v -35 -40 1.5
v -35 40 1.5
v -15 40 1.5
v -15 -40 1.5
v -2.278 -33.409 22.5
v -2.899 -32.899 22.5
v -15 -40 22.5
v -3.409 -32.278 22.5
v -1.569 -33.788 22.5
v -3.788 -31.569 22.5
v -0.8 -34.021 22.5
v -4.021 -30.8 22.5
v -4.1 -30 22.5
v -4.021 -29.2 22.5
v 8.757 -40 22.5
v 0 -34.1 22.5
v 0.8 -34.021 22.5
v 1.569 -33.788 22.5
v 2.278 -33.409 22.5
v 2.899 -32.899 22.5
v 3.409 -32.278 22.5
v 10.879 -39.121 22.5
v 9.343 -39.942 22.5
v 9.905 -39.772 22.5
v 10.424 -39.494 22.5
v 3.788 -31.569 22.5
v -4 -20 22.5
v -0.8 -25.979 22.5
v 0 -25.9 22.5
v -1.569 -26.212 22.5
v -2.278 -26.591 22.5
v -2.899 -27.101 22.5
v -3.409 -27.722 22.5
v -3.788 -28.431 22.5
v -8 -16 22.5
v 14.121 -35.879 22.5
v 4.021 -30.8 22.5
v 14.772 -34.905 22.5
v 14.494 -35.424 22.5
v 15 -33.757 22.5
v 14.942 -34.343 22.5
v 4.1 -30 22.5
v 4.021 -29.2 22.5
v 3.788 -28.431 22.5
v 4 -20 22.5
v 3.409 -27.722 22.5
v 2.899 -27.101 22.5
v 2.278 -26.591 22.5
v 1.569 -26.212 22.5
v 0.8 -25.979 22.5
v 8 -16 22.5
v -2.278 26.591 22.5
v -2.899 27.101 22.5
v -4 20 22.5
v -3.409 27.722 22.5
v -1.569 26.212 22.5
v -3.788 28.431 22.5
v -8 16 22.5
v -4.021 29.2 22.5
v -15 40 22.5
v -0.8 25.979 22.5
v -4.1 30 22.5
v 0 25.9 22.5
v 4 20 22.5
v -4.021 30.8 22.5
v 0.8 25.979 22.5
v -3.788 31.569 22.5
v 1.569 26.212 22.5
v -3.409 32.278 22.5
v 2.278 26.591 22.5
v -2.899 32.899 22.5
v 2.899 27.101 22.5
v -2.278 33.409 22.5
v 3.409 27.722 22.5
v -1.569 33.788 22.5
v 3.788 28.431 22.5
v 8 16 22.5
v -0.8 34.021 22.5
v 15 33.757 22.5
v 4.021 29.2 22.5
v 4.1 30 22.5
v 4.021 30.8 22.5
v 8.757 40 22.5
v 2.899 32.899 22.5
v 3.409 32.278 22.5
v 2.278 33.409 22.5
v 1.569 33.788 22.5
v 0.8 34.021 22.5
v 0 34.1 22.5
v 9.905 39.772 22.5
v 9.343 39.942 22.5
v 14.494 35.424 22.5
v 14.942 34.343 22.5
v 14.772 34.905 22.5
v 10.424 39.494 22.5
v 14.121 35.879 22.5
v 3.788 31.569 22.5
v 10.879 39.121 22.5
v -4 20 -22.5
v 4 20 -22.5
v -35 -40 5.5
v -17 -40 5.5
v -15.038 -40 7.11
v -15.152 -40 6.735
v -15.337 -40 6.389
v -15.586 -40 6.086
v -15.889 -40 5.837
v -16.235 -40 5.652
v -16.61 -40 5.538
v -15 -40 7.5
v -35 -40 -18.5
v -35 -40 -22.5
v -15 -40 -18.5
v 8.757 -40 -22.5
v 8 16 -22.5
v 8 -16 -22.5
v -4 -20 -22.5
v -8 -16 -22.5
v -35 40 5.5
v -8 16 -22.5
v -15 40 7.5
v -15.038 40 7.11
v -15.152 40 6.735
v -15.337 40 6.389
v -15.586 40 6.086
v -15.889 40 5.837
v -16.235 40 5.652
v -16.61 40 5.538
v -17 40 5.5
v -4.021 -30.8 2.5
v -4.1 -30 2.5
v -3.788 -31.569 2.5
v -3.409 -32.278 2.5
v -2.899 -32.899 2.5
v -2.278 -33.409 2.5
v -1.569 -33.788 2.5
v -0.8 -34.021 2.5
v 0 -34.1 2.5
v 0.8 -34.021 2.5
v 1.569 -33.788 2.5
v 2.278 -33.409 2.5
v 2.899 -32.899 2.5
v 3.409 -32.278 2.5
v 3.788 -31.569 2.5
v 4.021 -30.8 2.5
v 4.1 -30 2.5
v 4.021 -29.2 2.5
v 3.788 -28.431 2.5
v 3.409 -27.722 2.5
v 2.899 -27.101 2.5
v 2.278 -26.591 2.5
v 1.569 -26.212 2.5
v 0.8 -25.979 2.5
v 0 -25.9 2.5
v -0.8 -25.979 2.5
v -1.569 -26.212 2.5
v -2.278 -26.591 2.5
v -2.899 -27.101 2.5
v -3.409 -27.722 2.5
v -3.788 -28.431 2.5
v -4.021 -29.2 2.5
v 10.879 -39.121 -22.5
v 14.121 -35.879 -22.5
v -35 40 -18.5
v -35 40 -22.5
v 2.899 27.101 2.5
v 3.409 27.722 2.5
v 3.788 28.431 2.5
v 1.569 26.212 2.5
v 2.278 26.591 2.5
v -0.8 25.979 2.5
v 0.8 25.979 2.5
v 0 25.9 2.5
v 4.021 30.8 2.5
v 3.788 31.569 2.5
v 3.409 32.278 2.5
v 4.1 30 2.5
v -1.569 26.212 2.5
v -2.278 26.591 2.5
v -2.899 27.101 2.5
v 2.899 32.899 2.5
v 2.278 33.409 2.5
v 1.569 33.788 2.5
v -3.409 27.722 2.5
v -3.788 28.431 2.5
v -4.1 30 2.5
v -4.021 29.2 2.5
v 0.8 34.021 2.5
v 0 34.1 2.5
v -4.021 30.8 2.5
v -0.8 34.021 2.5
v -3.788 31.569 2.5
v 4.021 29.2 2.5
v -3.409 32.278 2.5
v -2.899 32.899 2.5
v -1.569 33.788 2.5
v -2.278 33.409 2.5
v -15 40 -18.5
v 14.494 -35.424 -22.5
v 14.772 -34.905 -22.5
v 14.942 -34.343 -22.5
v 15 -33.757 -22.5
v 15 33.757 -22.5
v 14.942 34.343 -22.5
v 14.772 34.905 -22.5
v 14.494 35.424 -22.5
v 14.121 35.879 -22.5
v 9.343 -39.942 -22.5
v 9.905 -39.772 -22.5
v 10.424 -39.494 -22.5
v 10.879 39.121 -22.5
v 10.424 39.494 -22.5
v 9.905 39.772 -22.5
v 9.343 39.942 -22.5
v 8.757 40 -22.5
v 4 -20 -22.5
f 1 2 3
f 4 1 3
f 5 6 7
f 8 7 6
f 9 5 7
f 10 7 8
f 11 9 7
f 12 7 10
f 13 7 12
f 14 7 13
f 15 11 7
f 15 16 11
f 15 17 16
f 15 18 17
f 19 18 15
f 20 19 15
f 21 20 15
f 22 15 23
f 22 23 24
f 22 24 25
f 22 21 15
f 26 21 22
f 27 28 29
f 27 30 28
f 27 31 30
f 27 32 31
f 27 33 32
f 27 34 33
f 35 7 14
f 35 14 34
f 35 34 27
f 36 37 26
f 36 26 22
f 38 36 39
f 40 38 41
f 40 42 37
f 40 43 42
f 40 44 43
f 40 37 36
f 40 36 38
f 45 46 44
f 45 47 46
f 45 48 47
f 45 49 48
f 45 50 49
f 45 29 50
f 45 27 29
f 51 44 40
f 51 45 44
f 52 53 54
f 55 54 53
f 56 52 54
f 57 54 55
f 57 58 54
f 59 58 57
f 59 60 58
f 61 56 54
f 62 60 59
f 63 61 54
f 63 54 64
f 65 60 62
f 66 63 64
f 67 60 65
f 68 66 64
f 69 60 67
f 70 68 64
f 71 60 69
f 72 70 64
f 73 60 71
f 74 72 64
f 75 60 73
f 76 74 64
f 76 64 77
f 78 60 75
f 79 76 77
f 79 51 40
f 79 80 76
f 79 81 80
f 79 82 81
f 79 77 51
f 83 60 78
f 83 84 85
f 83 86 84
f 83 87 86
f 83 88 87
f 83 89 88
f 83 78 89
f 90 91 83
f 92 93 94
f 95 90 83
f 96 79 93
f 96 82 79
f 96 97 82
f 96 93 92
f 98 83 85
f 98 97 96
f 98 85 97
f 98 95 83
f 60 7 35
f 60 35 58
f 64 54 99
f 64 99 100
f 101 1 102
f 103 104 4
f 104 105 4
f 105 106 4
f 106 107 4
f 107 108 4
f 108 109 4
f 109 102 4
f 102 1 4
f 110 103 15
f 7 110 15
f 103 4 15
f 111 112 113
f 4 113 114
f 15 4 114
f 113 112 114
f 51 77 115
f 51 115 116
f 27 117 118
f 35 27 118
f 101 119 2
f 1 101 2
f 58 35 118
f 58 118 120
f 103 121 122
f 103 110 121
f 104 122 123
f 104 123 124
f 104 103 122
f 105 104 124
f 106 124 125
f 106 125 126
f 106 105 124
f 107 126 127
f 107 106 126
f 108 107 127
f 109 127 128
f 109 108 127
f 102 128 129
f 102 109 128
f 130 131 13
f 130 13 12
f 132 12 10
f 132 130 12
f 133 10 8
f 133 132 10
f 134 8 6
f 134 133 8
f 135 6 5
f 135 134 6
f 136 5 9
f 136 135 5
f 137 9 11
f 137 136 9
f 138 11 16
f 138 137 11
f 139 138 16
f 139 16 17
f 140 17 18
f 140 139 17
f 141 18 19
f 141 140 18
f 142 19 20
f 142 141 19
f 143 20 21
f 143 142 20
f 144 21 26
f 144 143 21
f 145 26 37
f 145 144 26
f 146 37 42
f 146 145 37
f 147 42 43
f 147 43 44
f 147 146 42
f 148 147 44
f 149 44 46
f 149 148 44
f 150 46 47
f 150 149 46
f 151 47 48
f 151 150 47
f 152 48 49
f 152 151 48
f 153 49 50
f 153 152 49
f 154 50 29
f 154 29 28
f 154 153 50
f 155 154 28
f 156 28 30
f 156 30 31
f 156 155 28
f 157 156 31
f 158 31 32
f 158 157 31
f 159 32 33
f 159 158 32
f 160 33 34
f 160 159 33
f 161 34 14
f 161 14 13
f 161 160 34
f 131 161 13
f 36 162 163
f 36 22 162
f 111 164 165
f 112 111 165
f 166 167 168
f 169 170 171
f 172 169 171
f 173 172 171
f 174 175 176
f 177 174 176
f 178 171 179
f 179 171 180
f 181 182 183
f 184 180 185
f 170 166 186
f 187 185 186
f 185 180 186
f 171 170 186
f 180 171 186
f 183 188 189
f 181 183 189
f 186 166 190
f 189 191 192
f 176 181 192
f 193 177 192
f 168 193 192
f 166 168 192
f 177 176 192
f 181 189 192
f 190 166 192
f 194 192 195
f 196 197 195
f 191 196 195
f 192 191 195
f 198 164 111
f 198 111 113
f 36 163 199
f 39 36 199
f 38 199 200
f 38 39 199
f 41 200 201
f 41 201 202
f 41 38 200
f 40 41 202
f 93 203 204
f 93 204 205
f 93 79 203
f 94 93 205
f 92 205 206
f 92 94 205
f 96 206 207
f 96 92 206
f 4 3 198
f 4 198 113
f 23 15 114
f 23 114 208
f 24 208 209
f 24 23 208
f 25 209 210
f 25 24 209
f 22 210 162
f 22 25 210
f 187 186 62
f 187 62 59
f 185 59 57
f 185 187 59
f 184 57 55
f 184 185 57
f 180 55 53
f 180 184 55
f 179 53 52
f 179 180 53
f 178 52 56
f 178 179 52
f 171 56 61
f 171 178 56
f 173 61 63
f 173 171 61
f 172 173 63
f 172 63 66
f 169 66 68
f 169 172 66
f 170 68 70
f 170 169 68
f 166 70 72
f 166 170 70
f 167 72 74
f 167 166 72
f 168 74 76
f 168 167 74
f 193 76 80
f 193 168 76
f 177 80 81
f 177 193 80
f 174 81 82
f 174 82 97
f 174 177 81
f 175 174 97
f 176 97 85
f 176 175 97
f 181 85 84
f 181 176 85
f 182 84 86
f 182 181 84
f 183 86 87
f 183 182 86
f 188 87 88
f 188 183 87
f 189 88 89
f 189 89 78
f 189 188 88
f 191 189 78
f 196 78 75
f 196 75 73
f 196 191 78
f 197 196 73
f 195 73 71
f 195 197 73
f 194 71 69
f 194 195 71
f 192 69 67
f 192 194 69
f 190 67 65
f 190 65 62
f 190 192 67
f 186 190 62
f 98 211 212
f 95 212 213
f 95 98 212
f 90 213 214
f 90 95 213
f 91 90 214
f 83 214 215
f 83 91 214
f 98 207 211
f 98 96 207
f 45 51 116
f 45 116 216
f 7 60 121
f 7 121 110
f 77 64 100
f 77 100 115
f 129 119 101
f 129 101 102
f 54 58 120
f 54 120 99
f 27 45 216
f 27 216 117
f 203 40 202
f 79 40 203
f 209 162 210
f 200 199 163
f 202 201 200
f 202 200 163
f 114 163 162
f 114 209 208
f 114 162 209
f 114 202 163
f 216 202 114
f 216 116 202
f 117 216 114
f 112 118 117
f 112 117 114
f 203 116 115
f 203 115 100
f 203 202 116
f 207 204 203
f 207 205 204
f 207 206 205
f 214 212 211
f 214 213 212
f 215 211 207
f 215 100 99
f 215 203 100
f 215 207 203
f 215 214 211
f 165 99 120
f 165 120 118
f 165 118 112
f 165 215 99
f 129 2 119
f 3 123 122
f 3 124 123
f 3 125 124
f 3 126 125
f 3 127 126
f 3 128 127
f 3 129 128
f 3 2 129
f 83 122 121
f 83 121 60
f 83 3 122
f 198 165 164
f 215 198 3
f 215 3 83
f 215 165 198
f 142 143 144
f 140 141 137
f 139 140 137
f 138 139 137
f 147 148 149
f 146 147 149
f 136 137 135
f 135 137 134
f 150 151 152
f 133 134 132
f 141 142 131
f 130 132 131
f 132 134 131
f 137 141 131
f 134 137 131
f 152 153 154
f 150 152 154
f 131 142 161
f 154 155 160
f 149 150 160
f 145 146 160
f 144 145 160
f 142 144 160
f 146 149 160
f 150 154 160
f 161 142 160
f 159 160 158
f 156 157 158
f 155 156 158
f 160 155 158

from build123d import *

# Parameters (mm, degrees)
CROQUIS1_R              = 4.1
SALIENTE_EXTRUIR1_DEPTH = 22.5
CROQUIS2_W              = 20
CROQUIS2_H              = 4
SALIENTE_EXTRUIR2_DEPTH = 80
REDONDEO1_R             = 2
CROQUIS3_R              = 4.1
SALIENTE_EXTRUIR3_DEPTH = 25


with BuildPart() as part:
    # Croquis1 → Saliente-Extruir1 (new, symmetric)
    with BuildSketch(Plane.XY):
        with BuildLine():
            Line((14.121320343, 35.878679656), (10.878679656, 39.121320344))
            ThreePointArc((10.878679656, 39.121320344), (9.90540961, 39.771638598), (8.757359313, 40))
            Line((8.757359313, 40), (-15, 40))
            Line((-15, 40), (-15, -40))
            Line((-15, -40), (8.757359313, -40))
            ThreePointArc((8.757359313, -40), (9.90540961, -39.771638598), (10.878679656, -39.121320344))
            Line((10.878679656, -39.121320344), (14.121320343, -35.878679656))
            ThreePointArc((14.121320343, -35.878679656), (14.771638597, -34.90540961), (15, -33.757359313))
            Line((15, -33.757359313), (15, 33.757359313))
            ThreePointArc((15, 33.757359313), (14.771638597, 34.90540961), (14.121320343, 35.878679656))
        make_face()
        with Locations(Location((0, 30, 0), (0, 0, 180))):
            Circle(CROQUIS1_R, mode=Mode.SUBTRACT)
        with Locations(Location((0, -30, 0), (0, 0, 180))):
            Circle(CROQUIS1_R, mode=Mode.SUBTRACT)
        Polygon((-4, -20), (-8, -16), (-8, 16), (-4, 20), (4, 20), (8, 16), (8, -16), (4, -20), align=None, mode=Mode.SUBTRACT)
    extrude(amount=SALIENTE_EXTRUIR1_DEPTH, both=True)

    # Croquis2 → Saliente-Extruir2 (add)
    with BuildSketch(Plane(origin=(0, 40, 0), x_dir=(1, 0, 0), z_dir=(0, 1, 0))):
        with Locations((-25, 20.5)):
            Rectangle(CROQUIS2_W, CROQUIS2_H)
        with Locations((-25, -3.5)):
            Rectangle(CROQUIS2_W, CROQUIS2_H)
    extrude(amount=-SALIENTE_EXTRUIR2_DEPTH)

    # Redondeo1
    redondeo1_edges = [part.edges().sort_by_distance(p)[0] for p in [
        (-15, 0, 5.5),
    ]]
    fillet(redondeo1_edges, radius=REDONDEO1_R)

    # Croquis3 → Saliente-Extruir3 (add)
    with BuildSketch(Plane(origin=(0, 0, -22.5), x_dir=(-1, 0, 0), z_dir=(0, 0, -1))):
        with Locations((0, -30)):
            Circle(CROQUIS3_R)
        with Locations((0, 30)):
            Circle(CROQUIS3_R)
    extrude(amount=-SALIENTE_EXTRUIR3_DEPTH)


solid = part.part
